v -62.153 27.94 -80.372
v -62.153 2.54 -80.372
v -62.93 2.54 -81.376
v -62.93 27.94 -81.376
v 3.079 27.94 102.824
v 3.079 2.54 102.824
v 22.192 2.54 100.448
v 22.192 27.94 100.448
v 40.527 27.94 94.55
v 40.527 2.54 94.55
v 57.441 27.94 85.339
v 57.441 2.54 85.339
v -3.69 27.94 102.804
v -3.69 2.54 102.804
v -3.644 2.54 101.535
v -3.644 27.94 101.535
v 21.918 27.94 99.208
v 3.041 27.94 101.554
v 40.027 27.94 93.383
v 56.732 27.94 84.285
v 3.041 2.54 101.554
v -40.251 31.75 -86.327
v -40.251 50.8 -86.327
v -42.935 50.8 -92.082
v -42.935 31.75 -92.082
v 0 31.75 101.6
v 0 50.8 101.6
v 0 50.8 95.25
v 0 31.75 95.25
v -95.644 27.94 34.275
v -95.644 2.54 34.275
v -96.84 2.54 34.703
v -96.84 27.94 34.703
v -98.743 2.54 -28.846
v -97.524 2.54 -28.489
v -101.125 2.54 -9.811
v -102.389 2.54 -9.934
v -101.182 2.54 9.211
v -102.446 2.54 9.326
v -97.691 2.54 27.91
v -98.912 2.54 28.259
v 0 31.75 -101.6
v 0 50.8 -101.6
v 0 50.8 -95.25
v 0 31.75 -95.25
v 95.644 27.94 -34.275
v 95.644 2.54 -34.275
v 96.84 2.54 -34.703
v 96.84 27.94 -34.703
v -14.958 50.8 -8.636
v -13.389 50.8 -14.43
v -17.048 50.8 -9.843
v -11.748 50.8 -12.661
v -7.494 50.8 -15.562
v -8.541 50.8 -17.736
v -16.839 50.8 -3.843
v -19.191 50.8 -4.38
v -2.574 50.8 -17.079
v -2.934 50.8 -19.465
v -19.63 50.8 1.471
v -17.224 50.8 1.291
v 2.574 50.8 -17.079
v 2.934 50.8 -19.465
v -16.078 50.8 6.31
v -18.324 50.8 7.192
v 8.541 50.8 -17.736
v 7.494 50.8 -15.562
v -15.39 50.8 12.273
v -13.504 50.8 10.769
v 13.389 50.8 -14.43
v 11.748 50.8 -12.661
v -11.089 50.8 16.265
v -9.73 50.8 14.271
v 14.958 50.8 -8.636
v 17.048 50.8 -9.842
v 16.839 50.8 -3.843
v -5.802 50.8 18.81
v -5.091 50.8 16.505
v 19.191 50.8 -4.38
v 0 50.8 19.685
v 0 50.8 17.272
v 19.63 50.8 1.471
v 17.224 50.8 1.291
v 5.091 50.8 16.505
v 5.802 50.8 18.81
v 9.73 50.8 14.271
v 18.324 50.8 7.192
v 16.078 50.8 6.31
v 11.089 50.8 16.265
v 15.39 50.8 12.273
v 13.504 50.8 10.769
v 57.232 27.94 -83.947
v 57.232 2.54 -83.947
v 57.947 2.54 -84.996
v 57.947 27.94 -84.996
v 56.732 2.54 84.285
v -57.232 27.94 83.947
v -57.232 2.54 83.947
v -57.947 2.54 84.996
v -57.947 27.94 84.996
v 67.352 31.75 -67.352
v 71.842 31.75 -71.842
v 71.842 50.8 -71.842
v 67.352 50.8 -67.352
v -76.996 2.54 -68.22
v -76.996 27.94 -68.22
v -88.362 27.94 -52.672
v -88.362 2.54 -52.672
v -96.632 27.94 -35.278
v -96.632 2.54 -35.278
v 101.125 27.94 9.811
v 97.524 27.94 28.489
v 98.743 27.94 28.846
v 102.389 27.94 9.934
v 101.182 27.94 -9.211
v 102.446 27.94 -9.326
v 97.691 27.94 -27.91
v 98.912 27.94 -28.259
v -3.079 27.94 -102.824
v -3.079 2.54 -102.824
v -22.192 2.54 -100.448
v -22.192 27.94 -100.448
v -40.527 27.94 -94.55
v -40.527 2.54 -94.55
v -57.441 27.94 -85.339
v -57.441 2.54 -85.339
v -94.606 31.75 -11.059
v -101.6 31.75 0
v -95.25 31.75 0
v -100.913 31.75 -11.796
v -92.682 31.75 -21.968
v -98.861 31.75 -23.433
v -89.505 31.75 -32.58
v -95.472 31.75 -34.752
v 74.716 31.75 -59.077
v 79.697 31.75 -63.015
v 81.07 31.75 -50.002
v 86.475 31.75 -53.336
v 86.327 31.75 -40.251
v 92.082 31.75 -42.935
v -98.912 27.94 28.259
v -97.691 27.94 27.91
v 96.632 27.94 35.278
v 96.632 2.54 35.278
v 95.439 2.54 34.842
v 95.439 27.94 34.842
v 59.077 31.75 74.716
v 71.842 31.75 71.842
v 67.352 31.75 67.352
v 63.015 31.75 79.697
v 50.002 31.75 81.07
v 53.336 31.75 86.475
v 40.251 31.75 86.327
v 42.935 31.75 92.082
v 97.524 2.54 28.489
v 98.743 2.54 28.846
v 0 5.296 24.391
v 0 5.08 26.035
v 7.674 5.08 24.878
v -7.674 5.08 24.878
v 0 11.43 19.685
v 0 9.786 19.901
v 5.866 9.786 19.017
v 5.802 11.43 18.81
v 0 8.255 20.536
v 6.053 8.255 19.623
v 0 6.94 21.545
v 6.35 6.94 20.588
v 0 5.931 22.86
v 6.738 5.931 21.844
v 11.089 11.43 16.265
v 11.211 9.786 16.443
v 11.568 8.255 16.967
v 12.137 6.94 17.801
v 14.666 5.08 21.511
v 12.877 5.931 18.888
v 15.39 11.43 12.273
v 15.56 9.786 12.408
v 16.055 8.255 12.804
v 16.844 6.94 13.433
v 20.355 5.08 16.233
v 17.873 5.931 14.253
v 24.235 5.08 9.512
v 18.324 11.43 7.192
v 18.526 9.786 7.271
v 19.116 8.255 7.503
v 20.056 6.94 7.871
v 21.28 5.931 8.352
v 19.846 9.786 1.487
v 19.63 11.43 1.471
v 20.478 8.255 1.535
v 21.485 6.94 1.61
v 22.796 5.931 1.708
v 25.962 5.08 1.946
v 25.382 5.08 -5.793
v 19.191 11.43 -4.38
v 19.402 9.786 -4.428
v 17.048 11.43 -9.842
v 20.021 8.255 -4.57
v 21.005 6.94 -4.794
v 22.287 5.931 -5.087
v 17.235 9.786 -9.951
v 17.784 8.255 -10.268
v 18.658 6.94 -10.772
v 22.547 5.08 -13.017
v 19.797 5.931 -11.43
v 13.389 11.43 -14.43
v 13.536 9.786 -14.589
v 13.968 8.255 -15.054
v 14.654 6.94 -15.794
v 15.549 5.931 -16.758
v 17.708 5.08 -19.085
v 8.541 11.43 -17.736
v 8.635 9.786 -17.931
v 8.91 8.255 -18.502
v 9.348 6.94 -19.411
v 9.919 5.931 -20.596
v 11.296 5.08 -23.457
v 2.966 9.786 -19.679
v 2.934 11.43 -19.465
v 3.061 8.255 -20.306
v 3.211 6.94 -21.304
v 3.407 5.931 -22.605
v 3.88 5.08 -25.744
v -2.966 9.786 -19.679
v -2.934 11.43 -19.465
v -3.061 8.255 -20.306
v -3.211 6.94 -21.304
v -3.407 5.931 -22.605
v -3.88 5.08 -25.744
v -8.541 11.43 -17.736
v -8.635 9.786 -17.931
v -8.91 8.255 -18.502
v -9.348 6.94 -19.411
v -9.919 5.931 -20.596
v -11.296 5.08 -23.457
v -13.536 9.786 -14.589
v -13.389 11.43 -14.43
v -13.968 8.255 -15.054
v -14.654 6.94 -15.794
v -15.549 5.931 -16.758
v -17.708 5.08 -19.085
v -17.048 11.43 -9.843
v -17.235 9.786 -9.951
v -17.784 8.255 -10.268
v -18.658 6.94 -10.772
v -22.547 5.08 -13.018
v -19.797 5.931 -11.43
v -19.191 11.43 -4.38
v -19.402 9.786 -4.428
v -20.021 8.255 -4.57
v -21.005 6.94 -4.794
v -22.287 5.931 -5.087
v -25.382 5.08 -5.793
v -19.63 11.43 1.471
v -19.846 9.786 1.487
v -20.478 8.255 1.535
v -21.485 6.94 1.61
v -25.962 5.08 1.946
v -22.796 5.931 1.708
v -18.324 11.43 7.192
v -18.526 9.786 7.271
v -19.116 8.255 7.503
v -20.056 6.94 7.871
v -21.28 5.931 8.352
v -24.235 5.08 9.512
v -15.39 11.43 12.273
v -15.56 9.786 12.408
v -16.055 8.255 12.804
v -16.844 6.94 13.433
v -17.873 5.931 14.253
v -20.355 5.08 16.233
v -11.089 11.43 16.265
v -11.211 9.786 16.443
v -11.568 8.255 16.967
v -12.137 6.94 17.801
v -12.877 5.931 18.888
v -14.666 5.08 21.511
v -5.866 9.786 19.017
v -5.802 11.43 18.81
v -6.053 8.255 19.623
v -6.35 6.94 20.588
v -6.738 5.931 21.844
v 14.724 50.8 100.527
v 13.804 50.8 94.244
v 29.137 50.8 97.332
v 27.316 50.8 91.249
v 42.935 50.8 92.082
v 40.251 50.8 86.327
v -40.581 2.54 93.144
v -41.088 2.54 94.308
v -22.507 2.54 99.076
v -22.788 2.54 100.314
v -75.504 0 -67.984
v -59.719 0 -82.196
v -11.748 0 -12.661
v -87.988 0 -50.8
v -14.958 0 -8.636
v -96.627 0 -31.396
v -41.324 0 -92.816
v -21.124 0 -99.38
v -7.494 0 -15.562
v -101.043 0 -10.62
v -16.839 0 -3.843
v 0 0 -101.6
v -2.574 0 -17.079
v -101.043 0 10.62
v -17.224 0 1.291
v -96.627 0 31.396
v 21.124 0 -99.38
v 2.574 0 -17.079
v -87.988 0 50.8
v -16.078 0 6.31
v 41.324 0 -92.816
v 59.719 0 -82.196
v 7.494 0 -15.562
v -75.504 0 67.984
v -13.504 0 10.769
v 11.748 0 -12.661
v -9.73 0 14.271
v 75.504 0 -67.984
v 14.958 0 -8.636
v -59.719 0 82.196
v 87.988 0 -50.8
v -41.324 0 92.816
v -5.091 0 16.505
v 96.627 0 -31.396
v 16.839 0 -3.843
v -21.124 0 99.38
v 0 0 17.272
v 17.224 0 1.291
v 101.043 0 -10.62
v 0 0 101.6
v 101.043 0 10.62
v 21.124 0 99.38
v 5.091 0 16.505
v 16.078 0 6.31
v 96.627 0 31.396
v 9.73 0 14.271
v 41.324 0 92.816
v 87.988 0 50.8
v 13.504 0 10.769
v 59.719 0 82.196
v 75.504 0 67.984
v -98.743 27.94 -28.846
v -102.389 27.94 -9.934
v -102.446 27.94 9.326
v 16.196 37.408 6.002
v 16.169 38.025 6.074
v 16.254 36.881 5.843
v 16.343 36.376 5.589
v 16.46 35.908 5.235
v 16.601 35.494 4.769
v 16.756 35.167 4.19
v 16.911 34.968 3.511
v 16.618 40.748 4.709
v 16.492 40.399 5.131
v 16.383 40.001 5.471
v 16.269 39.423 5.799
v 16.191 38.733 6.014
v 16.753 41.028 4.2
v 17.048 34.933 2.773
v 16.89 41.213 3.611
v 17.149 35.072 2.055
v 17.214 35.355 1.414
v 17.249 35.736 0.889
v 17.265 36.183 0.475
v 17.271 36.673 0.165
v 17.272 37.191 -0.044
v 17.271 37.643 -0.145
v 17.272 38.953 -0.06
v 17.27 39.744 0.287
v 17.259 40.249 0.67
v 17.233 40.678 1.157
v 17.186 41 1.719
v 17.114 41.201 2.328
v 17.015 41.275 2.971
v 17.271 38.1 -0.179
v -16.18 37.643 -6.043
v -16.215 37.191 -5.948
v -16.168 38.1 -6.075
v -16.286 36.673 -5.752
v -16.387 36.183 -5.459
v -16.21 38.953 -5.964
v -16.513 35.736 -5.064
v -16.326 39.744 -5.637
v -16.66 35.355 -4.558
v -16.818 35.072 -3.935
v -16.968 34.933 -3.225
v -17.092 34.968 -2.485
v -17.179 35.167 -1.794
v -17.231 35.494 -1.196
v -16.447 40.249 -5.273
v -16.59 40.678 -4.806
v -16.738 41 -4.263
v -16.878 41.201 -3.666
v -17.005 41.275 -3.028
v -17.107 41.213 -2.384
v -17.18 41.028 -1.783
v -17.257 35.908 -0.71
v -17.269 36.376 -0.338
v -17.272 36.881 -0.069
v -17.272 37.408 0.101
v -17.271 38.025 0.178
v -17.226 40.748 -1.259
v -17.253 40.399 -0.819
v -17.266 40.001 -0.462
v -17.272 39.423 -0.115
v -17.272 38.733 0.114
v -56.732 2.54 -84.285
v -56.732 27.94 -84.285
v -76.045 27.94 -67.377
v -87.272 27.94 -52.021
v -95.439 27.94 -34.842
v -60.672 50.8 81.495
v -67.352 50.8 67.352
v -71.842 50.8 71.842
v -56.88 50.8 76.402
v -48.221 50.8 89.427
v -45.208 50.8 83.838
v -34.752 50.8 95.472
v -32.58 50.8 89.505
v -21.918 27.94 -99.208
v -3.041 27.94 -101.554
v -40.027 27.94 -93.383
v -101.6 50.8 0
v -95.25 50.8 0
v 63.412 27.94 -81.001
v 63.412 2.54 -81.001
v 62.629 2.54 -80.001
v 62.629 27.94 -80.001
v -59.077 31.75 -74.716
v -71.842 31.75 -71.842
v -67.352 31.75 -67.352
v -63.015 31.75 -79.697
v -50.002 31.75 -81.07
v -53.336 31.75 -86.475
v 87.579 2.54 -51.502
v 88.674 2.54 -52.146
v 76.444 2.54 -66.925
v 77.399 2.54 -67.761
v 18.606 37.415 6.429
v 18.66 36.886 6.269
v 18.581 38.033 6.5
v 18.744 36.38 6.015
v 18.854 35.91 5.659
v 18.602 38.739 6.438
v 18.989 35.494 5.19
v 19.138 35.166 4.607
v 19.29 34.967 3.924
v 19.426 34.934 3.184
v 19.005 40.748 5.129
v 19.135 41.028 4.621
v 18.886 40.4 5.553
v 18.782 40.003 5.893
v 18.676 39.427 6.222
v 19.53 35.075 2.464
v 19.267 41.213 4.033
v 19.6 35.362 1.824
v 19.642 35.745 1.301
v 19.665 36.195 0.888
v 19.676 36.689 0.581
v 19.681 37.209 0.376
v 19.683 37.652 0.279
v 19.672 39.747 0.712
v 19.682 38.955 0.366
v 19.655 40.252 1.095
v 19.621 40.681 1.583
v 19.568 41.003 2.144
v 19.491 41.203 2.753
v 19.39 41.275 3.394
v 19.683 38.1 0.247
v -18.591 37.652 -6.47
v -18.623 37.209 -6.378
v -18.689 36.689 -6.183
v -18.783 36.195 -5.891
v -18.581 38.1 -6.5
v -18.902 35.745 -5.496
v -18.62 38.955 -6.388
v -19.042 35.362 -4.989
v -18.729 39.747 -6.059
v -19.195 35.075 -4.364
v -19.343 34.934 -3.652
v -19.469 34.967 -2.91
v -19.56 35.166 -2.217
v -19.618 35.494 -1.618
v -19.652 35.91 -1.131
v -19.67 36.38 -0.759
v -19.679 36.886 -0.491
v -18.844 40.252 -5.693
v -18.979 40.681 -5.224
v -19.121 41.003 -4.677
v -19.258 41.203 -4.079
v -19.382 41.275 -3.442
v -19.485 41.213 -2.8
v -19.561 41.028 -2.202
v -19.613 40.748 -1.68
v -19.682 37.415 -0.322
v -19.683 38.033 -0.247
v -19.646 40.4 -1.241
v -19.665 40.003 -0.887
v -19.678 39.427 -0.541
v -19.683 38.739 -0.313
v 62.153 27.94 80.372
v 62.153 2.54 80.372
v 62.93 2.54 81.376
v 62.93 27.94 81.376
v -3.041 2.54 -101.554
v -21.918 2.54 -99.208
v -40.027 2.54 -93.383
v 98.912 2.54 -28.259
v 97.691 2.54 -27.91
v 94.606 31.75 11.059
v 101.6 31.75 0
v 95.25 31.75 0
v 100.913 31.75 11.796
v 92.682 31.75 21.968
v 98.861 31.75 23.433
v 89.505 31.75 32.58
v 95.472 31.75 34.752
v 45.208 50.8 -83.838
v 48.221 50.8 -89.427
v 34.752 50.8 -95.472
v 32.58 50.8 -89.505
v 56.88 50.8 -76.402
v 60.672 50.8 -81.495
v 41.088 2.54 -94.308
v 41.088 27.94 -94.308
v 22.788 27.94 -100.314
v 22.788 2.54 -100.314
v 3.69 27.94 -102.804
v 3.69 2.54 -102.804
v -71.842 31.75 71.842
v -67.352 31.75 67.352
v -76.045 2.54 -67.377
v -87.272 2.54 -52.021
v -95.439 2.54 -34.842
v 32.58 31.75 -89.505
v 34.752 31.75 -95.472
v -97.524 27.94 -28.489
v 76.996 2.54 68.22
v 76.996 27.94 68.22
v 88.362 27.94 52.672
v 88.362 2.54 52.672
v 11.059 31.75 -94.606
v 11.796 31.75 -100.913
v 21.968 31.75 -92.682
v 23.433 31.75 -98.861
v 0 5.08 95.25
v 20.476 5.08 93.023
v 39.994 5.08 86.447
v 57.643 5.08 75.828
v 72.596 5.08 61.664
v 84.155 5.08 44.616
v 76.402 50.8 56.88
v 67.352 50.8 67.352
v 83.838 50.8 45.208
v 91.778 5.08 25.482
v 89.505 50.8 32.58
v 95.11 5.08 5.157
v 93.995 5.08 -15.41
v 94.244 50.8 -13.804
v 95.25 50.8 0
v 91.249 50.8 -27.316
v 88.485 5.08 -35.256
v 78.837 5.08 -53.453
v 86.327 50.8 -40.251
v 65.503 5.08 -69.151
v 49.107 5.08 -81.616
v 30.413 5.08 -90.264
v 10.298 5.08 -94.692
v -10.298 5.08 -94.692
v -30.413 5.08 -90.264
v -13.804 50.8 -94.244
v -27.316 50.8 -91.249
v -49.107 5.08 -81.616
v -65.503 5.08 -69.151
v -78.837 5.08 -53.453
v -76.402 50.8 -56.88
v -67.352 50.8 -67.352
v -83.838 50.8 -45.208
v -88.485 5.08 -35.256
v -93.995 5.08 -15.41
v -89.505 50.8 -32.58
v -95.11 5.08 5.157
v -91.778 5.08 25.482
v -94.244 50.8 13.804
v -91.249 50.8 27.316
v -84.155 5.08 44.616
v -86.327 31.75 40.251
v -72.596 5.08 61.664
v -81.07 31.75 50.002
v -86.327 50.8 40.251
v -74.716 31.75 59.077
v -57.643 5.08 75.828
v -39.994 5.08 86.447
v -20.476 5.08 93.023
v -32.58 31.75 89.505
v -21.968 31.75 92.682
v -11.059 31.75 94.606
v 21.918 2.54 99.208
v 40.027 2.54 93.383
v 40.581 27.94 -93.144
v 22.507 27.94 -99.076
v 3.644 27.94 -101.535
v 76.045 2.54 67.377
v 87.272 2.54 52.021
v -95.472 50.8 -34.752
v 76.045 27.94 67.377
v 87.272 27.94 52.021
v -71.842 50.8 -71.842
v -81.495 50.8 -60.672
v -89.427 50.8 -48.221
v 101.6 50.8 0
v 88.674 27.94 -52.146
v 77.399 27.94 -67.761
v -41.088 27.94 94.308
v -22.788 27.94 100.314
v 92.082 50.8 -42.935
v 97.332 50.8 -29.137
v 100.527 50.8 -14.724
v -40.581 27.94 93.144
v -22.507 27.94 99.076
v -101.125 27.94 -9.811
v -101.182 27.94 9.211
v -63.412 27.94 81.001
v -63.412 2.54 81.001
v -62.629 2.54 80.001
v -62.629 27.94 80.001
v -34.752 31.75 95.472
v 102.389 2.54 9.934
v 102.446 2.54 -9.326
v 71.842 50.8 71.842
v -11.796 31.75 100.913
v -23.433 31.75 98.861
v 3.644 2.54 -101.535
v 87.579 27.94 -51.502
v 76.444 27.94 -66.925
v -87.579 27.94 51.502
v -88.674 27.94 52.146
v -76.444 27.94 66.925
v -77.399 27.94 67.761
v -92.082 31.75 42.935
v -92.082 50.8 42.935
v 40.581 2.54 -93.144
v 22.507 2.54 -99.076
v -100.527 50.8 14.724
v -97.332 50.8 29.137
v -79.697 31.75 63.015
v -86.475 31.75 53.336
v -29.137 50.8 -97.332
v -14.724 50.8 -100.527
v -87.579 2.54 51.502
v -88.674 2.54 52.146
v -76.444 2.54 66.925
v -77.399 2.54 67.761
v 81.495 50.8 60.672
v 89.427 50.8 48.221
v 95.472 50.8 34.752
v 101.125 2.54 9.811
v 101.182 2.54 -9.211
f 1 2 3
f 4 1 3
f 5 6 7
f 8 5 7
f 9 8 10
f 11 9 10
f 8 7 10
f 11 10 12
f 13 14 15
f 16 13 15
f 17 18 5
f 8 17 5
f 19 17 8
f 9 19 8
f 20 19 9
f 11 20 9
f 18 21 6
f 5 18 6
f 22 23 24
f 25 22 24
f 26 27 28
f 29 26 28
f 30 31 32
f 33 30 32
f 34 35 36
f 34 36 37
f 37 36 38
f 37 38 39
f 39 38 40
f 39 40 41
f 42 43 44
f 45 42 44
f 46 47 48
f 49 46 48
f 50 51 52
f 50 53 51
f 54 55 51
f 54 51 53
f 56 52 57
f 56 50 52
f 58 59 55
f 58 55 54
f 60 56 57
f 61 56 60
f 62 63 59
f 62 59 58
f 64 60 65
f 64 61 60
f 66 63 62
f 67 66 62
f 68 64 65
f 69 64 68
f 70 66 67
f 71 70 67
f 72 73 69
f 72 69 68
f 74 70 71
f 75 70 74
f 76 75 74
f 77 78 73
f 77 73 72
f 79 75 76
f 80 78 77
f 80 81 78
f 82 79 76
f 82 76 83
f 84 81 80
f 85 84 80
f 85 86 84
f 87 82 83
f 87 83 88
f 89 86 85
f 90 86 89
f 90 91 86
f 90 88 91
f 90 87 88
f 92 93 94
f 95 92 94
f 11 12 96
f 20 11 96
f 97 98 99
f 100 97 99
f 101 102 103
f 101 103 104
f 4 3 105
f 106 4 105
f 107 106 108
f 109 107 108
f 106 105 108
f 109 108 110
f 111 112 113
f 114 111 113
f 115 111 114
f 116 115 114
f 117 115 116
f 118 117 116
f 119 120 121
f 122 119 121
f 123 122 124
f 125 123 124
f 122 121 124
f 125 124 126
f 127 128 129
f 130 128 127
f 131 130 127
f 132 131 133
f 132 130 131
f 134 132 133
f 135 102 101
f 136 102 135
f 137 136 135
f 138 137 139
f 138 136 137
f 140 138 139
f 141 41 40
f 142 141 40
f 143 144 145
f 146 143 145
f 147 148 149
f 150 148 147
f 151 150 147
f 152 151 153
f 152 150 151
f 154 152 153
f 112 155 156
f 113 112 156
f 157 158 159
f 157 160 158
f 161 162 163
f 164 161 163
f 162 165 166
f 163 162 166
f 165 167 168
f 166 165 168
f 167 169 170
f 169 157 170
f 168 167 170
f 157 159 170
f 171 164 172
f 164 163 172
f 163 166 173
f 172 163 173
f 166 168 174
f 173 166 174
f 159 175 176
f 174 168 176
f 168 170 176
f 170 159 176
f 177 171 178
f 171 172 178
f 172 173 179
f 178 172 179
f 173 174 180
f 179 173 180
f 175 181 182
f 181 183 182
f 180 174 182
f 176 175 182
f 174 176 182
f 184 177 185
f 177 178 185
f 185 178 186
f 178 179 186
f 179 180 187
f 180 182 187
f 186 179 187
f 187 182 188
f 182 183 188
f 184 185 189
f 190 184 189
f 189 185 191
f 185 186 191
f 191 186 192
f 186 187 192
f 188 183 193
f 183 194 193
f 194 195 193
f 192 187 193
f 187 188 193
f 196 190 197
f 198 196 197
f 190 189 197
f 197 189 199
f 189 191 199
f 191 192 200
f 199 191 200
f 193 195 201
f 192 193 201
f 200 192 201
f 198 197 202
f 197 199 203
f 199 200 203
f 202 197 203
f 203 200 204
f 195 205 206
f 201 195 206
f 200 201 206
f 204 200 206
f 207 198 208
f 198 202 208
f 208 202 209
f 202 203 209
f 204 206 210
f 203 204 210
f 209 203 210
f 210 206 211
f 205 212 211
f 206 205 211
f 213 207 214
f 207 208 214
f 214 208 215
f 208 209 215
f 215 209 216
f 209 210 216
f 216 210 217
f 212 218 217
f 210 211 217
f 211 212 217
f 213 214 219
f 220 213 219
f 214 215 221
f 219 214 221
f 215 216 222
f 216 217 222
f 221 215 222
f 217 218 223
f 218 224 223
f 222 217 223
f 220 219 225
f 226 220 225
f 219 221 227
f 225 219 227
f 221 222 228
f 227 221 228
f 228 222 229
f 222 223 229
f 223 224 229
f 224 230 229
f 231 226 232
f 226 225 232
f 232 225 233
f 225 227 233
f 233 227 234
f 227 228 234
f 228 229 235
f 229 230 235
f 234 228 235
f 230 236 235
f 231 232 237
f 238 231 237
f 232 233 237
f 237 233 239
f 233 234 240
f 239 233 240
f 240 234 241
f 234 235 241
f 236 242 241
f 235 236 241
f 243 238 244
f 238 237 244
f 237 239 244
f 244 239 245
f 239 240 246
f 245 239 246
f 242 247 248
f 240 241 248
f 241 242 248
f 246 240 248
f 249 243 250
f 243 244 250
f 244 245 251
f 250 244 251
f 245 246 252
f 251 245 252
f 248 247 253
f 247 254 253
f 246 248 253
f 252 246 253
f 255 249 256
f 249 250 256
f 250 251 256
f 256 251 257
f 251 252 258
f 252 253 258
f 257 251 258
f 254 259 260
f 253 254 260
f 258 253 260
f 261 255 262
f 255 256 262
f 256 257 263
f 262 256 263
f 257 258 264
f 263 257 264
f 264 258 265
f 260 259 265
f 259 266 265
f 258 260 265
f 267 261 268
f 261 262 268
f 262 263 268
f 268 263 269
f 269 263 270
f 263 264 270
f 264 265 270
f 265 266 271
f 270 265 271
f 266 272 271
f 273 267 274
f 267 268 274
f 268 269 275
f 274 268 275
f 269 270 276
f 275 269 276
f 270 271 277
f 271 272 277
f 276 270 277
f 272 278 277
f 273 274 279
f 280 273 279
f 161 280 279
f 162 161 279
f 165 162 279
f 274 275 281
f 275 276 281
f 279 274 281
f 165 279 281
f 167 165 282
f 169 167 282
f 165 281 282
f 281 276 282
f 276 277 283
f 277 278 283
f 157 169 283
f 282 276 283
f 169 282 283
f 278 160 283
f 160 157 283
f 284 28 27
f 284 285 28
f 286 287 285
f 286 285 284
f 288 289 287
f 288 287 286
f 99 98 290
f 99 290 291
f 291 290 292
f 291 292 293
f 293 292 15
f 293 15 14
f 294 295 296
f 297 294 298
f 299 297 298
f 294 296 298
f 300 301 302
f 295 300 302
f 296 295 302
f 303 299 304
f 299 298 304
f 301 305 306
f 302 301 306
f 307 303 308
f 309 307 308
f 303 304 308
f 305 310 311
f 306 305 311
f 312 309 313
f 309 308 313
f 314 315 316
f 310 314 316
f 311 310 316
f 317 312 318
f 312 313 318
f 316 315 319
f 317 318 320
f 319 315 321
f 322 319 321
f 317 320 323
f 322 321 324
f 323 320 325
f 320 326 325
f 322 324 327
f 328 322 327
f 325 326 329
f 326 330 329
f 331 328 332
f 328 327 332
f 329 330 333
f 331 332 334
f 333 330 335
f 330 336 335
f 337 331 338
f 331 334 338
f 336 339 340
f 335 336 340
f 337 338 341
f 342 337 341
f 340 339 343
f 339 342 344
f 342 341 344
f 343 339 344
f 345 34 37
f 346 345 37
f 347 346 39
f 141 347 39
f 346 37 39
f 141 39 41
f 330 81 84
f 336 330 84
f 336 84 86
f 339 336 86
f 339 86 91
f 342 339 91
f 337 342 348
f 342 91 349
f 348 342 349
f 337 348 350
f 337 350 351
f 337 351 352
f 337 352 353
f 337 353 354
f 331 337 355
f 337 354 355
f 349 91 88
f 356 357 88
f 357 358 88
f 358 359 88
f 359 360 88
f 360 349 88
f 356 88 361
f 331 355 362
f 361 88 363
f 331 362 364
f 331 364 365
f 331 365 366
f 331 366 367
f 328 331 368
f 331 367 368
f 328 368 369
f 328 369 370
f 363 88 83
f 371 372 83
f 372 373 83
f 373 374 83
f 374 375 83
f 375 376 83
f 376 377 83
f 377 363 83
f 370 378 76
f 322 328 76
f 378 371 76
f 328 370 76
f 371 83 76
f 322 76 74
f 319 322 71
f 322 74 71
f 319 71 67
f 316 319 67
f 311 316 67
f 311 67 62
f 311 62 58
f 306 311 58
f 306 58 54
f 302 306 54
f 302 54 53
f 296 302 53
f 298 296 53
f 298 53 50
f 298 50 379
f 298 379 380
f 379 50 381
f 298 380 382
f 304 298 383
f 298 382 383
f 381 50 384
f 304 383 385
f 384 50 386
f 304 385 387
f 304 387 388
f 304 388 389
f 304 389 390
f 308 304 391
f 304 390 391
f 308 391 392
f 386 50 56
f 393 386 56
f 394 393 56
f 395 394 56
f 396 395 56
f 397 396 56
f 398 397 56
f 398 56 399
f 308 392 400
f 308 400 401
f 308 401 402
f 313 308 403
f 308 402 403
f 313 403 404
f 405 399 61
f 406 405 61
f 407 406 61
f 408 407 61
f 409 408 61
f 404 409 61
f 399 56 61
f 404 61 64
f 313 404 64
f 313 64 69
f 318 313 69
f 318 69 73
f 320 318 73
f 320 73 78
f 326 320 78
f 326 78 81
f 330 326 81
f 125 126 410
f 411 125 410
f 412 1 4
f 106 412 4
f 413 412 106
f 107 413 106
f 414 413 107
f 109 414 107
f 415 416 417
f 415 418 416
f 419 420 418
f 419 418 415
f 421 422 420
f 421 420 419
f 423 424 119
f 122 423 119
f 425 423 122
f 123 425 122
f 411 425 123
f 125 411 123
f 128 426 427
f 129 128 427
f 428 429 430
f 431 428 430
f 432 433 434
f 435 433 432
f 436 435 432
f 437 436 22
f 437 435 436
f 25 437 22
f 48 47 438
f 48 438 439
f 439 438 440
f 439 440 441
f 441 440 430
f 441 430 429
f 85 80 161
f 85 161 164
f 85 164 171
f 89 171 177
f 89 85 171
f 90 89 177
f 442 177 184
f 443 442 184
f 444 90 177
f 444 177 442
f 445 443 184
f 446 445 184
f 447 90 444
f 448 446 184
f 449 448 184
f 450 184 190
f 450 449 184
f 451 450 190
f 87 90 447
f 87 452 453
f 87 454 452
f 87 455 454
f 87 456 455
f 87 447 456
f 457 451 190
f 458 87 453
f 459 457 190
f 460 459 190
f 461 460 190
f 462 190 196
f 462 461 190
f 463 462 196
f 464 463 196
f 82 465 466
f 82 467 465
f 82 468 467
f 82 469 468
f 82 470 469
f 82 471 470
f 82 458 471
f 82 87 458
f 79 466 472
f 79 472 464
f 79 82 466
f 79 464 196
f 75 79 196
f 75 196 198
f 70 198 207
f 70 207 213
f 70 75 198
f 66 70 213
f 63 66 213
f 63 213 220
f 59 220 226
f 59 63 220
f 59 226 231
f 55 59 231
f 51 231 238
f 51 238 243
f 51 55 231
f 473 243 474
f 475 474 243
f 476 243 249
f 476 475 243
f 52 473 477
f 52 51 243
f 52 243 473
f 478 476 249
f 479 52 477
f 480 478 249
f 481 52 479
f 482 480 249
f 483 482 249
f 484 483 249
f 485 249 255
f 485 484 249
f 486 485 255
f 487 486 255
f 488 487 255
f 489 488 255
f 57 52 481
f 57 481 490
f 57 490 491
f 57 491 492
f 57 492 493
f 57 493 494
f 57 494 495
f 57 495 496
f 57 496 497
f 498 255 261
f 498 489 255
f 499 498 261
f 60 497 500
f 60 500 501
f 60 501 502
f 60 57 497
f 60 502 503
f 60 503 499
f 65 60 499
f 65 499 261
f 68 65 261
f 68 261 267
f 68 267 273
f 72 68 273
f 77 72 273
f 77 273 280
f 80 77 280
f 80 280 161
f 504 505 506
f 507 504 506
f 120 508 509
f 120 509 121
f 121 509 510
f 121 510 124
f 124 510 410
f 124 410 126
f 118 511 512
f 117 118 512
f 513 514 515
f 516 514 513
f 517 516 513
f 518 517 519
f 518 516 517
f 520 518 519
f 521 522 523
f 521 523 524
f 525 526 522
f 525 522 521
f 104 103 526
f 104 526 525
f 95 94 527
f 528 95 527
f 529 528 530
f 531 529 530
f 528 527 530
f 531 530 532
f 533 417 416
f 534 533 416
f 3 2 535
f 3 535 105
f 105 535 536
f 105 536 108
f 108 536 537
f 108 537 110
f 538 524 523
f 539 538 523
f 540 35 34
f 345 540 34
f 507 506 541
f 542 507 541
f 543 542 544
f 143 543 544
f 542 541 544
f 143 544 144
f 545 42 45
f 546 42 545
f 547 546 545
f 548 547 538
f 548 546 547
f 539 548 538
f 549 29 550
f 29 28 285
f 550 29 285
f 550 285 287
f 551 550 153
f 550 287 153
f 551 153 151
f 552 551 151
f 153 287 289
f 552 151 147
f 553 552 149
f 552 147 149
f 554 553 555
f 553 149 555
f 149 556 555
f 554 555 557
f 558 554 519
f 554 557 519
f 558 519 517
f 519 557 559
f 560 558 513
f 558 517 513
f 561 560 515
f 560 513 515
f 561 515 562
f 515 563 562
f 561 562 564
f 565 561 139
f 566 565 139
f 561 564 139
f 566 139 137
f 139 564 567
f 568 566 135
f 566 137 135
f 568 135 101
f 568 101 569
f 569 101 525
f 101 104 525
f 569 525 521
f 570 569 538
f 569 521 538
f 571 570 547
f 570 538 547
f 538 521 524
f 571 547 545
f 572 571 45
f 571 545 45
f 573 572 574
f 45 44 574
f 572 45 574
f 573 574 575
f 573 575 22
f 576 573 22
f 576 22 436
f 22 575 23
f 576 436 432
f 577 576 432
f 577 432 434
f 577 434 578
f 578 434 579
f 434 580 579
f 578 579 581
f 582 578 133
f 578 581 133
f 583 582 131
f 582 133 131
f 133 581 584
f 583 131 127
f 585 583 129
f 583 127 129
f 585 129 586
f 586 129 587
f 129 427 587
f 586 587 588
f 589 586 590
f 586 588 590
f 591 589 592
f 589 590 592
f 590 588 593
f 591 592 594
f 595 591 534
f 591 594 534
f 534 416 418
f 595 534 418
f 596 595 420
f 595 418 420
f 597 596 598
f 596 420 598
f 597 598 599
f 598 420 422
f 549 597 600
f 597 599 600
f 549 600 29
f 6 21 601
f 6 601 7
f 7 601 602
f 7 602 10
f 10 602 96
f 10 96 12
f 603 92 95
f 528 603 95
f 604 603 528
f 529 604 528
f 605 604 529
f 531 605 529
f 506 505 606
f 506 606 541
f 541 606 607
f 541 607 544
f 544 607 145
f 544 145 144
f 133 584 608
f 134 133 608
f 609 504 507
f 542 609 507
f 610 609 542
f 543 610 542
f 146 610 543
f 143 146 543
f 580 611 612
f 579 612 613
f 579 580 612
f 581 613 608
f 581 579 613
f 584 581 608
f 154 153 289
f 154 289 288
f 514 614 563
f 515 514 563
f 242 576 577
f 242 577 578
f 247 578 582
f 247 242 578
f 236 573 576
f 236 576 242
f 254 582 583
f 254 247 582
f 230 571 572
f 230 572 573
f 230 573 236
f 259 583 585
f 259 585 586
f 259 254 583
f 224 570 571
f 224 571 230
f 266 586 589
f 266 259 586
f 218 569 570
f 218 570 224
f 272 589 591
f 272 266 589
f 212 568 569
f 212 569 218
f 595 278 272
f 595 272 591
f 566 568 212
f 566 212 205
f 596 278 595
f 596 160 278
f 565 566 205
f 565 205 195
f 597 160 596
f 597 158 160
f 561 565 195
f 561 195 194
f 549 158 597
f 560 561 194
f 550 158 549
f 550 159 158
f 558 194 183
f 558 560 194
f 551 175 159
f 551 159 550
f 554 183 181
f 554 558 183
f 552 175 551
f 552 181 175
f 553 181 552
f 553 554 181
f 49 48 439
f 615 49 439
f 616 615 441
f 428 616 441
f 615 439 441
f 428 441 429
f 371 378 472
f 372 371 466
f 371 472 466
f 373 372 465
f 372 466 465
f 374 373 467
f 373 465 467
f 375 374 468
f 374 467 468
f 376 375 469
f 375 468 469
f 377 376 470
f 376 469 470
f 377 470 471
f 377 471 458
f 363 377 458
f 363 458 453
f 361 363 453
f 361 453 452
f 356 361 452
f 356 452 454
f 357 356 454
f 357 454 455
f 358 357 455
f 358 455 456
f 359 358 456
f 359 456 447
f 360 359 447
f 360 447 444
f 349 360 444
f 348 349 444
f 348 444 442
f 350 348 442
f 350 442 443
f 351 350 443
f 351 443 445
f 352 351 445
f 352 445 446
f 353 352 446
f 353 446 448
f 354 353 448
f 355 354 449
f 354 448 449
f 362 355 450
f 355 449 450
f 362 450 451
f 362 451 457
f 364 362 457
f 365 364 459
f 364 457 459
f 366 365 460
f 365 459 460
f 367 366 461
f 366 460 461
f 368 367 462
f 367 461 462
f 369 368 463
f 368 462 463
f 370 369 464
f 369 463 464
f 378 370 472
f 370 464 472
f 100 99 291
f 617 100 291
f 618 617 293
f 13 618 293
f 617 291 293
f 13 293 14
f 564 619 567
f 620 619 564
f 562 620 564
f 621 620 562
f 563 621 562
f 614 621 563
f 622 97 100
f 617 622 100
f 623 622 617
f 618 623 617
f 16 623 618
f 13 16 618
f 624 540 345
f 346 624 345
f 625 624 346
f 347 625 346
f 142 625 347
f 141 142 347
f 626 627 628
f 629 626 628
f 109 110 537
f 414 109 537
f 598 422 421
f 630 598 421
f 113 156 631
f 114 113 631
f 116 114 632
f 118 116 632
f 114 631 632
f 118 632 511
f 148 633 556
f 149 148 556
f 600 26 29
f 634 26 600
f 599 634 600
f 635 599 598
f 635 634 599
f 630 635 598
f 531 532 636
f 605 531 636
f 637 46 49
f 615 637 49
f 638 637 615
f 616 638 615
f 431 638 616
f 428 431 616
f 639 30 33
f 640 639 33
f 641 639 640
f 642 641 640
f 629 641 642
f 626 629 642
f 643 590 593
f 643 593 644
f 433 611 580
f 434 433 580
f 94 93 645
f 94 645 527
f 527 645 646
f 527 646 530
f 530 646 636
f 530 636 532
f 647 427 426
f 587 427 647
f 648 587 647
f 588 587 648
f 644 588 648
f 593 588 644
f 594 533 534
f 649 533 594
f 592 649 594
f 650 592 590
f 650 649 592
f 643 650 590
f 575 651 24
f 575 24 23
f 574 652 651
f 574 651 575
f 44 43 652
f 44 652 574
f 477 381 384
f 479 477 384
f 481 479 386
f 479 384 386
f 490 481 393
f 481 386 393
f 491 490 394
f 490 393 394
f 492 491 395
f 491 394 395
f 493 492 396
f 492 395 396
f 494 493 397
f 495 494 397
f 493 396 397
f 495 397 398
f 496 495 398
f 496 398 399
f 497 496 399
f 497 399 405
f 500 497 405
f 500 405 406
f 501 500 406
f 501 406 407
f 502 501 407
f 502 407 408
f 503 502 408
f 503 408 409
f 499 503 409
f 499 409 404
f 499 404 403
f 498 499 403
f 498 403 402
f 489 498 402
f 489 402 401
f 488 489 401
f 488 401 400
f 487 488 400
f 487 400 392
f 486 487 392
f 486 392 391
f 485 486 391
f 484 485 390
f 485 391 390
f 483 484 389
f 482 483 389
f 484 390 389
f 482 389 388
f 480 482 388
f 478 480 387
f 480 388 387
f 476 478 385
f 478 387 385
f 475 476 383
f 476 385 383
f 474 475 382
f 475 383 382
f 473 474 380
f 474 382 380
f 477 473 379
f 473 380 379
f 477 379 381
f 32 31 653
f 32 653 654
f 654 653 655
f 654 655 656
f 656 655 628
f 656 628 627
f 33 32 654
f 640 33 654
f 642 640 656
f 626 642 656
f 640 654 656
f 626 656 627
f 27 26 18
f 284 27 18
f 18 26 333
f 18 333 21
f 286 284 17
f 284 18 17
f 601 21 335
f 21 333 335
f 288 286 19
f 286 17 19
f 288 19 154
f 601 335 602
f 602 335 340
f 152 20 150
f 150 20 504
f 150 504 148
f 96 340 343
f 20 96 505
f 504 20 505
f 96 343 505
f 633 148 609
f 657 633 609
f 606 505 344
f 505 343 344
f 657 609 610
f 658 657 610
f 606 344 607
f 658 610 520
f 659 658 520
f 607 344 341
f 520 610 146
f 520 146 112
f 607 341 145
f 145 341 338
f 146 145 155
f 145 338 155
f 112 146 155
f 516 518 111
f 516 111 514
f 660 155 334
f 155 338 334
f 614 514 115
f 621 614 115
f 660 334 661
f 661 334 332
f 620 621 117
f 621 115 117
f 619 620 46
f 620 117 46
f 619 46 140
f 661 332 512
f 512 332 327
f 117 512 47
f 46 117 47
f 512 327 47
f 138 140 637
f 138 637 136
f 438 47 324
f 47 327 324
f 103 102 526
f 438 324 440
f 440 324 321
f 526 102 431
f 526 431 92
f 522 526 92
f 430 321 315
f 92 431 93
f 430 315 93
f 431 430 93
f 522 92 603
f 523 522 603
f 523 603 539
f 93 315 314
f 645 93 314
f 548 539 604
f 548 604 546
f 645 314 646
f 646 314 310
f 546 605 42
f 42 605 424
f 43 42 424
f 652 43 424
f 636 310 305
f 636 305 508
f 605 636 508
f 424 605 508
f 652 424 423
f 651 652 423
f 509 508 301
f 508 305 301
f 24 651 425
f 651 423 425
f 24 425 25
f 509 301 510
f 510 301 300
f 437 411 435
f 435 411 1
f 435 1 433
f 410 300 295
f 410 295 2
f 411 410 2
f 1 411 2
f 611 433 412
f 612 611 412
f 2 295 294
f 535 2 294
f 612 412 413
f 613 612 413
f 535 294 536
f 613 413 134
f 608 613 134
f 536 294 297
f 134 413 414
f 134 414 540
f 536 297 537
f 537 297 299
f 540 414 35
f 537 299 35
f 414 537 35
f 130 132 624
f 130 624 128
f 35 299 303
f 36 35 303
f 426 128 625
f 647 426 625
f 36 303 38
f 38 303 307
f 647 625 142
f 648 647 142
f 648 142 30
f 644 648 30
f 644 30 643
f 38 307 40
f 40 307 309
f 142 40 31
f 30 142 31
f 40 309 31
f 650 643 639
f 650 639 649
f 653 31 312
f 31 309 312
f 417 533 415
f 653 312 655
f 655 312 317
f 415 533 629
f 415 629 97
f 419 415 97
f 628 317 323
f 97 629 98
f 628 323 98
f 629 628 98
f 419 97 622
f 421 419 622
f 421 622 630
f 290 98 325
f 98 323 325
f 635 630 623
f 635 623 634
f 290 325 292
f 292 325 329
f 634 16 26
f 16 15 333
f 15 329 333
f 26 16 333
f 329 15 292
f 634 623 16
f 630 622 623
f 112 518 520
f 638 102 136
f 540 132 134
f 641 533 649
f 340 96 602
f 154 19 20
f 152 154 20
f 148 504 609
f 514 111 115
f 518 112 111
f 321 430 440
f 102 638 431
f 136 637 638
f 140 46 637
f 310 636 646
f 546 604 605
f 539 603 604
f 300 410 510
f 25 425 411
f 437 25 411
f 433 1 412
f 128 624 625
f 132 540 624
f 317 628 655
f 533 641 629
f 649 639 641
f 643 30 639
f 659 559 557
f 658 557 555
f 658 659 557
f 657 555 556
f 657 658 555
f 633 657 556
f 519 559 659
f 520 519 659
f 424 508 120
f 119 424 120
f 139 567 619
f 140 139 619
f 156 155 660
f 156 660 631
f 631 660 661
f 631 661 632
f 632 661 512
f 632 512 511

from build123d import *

# Parameters (mm, degrees)
SKETCH2_R           = 101.6
BOSS_EXTRUDE1_DEPTH = 50.8
SKETCH3_R           = 95.25
SKETCH3_R_2         = 19.685
CUT_EXTRUDE1_DEPTH  = 45.72
SKETCH4_R           = 17.272
CUT_EXTRUDE2_DEPTH  = 153.4
CUT_EXTRUDE3_START  = -19.05
CUT_EXTRUDE3_DEPTH  = 19.05
CIRPATTERN1_COUNT   = 8
WRAP1_START         = 2.54
WRAP1_DEPTH         = 25.4
CIRPATTERN2_COUNT   = 10
SKETCH9_R           = 3.175
CUT_EXTRUDE5_DEPTH  = 170.748495522
FILLET1_R           = 6.35


# Read off the part's stored shape, not the designer's step: Wrap1
with BuildPart() as part:
    # Sketch2 → Boss-Extrude1 (new body)
    with BuildSketch(Plane(origin=(0, 0, 0), x_dir=(1, 0, 0), z_dir=(0, 1, 0))):
        with Locations(Location((0, 0, 0), (0, 0, 270))):
            Circle(SKETCH2_R)
    extrude(amount=BOSS_EXTRUDE1_DEPTH)

    # Sketch3 → Cut-Extrude1 (cut)
    with BuildSketch(Plane(origin=(0, 50.8, 0), x_dir=(1, 0, 0), z_dir=(0, 1, 0))):
        with Locations(Location((0, 0, 0), (0, 0, 270))):
            Circle(SKETCH3_R)
        with Locations(Location((0, 0, 0), (0, 0, 270))):
            Circle(SKETCH3_R_2, mode=Mode.SUBTRACT)
    extrude(amount=-CUT_EXTRUDE1_DEPTH, mode=Mode.SUBTRACT)

    # Sketch4 → Cut-Extrude2 (cut, through all)
    with BuildSketch(Plane(origin=(0, 50.8, 0), x_dir=(1, 0, 0), z_dir=(0, 1, 0))):
        with Locations(Location((0, 0, 0), (0, 0, 270))):
            Circle(SKETCH4_R)
    extrude(amount=-CUT_EXTRUDE2_DEPTH, mode=Mode.SUBTRACT)

    # Sketch5 → Cut-Extrude3 (cut)
    with BuildSketch(Plane(origin=(0, 50.8, 0), x_dir=(1, 0, 0), z_dir=(0, 1, 0)).offset(CUT_EXTRUDE3_START)):
        with BuildLine():
            Line((0, 101.6), (0, 94.154505037))
            ThreePointArc((0, 94.154505037), (16.351324372, 92.723810373), (32.205726105, 88.475205707))
            Line((32.205726105, 88.475205707), (34.752471706, 95.471596354))
            ThreePointArc((34.752471706, 95.471596354), (17.644344851, 100.056169699), (0, 101.6))
        make_face()
    cut_extrude3 = extrude(amount=CUT_EXTRUDE3_DEPTH, mode=Mode.SUBTRACT)

    # CirPattern1: Cut-Extrude3 ×8 about axis
    cirpattern1_axis = Axis((0, 0, 0), (0, 1, 0))
    for i in range(1, CIRPATTERN1_COUNT):
        add(cut_extrude3.rotate(cirpattern1_axis, i * 360 / CIRPATTERN1_COUNT), mode=Mode.SUBTRACT)

    # Wrap1 outline → Wrap1 (add)
    with BuildSketch(Plane(origin=(0, 0, 0), x_dir=(1, 0, 0), z_dir=(0, 1, 0)).offset(WRAP1_START)):
        with BuildLine():
            ThreePointArc((98.742950455, -28.845565264), (102.869546579, -0.305428593), (98.912497991, 28.258709119))
            Line((98.912497991, 28.258709119), (97.691356041, 27.909836167))
            ThreePointArc((97.691356041, 27.909836167), (101.599552177, -0.30165787), (97.523901684, -28.489447175))
            Line((97.523901684, -28.489447175), (98.742950455, -28.845565264))
        make_face()
    wrap1 = extrude(amount=WRAP1_DEPTH)

    # CirPattern2: Wrap1 ×10 about axis
    cirpattern2_axis = Axis((0, 0, 0), (0, 1, 0))
    for i in range(1, CIRPATTERN2_COUNT):
        add(wrap1.rotate(cirpattern2_axis, i * 360 / CIRPATTERN2_COUNT))

    # Sketch9 → Cut-Extrude5 (cut, through all)
    with BuildSketch(Plane(origin=(19.385940618, 0, 3.418264377), x_dir=(0, 1, 0), z_dir=(0.9848077530122106, 0, 0.17364817766691706))):
        with Locations(Location((38.1, 0, 0), (0, 0, 270))):
            Circle(SKETCH9_R)
    extrude(amount=-CUT_EXTRUDE5_DEPTH, mode=Mode.SUBTRACT)

    # Fillet1
    fillet1_edges = [part.edges().sort_by_distance(p)[0] for p in [
        (0, 5.08, -19.685),
    ]]
    fillet(fillet1_edges, radius=FILLET1_R)


solid = part.part
